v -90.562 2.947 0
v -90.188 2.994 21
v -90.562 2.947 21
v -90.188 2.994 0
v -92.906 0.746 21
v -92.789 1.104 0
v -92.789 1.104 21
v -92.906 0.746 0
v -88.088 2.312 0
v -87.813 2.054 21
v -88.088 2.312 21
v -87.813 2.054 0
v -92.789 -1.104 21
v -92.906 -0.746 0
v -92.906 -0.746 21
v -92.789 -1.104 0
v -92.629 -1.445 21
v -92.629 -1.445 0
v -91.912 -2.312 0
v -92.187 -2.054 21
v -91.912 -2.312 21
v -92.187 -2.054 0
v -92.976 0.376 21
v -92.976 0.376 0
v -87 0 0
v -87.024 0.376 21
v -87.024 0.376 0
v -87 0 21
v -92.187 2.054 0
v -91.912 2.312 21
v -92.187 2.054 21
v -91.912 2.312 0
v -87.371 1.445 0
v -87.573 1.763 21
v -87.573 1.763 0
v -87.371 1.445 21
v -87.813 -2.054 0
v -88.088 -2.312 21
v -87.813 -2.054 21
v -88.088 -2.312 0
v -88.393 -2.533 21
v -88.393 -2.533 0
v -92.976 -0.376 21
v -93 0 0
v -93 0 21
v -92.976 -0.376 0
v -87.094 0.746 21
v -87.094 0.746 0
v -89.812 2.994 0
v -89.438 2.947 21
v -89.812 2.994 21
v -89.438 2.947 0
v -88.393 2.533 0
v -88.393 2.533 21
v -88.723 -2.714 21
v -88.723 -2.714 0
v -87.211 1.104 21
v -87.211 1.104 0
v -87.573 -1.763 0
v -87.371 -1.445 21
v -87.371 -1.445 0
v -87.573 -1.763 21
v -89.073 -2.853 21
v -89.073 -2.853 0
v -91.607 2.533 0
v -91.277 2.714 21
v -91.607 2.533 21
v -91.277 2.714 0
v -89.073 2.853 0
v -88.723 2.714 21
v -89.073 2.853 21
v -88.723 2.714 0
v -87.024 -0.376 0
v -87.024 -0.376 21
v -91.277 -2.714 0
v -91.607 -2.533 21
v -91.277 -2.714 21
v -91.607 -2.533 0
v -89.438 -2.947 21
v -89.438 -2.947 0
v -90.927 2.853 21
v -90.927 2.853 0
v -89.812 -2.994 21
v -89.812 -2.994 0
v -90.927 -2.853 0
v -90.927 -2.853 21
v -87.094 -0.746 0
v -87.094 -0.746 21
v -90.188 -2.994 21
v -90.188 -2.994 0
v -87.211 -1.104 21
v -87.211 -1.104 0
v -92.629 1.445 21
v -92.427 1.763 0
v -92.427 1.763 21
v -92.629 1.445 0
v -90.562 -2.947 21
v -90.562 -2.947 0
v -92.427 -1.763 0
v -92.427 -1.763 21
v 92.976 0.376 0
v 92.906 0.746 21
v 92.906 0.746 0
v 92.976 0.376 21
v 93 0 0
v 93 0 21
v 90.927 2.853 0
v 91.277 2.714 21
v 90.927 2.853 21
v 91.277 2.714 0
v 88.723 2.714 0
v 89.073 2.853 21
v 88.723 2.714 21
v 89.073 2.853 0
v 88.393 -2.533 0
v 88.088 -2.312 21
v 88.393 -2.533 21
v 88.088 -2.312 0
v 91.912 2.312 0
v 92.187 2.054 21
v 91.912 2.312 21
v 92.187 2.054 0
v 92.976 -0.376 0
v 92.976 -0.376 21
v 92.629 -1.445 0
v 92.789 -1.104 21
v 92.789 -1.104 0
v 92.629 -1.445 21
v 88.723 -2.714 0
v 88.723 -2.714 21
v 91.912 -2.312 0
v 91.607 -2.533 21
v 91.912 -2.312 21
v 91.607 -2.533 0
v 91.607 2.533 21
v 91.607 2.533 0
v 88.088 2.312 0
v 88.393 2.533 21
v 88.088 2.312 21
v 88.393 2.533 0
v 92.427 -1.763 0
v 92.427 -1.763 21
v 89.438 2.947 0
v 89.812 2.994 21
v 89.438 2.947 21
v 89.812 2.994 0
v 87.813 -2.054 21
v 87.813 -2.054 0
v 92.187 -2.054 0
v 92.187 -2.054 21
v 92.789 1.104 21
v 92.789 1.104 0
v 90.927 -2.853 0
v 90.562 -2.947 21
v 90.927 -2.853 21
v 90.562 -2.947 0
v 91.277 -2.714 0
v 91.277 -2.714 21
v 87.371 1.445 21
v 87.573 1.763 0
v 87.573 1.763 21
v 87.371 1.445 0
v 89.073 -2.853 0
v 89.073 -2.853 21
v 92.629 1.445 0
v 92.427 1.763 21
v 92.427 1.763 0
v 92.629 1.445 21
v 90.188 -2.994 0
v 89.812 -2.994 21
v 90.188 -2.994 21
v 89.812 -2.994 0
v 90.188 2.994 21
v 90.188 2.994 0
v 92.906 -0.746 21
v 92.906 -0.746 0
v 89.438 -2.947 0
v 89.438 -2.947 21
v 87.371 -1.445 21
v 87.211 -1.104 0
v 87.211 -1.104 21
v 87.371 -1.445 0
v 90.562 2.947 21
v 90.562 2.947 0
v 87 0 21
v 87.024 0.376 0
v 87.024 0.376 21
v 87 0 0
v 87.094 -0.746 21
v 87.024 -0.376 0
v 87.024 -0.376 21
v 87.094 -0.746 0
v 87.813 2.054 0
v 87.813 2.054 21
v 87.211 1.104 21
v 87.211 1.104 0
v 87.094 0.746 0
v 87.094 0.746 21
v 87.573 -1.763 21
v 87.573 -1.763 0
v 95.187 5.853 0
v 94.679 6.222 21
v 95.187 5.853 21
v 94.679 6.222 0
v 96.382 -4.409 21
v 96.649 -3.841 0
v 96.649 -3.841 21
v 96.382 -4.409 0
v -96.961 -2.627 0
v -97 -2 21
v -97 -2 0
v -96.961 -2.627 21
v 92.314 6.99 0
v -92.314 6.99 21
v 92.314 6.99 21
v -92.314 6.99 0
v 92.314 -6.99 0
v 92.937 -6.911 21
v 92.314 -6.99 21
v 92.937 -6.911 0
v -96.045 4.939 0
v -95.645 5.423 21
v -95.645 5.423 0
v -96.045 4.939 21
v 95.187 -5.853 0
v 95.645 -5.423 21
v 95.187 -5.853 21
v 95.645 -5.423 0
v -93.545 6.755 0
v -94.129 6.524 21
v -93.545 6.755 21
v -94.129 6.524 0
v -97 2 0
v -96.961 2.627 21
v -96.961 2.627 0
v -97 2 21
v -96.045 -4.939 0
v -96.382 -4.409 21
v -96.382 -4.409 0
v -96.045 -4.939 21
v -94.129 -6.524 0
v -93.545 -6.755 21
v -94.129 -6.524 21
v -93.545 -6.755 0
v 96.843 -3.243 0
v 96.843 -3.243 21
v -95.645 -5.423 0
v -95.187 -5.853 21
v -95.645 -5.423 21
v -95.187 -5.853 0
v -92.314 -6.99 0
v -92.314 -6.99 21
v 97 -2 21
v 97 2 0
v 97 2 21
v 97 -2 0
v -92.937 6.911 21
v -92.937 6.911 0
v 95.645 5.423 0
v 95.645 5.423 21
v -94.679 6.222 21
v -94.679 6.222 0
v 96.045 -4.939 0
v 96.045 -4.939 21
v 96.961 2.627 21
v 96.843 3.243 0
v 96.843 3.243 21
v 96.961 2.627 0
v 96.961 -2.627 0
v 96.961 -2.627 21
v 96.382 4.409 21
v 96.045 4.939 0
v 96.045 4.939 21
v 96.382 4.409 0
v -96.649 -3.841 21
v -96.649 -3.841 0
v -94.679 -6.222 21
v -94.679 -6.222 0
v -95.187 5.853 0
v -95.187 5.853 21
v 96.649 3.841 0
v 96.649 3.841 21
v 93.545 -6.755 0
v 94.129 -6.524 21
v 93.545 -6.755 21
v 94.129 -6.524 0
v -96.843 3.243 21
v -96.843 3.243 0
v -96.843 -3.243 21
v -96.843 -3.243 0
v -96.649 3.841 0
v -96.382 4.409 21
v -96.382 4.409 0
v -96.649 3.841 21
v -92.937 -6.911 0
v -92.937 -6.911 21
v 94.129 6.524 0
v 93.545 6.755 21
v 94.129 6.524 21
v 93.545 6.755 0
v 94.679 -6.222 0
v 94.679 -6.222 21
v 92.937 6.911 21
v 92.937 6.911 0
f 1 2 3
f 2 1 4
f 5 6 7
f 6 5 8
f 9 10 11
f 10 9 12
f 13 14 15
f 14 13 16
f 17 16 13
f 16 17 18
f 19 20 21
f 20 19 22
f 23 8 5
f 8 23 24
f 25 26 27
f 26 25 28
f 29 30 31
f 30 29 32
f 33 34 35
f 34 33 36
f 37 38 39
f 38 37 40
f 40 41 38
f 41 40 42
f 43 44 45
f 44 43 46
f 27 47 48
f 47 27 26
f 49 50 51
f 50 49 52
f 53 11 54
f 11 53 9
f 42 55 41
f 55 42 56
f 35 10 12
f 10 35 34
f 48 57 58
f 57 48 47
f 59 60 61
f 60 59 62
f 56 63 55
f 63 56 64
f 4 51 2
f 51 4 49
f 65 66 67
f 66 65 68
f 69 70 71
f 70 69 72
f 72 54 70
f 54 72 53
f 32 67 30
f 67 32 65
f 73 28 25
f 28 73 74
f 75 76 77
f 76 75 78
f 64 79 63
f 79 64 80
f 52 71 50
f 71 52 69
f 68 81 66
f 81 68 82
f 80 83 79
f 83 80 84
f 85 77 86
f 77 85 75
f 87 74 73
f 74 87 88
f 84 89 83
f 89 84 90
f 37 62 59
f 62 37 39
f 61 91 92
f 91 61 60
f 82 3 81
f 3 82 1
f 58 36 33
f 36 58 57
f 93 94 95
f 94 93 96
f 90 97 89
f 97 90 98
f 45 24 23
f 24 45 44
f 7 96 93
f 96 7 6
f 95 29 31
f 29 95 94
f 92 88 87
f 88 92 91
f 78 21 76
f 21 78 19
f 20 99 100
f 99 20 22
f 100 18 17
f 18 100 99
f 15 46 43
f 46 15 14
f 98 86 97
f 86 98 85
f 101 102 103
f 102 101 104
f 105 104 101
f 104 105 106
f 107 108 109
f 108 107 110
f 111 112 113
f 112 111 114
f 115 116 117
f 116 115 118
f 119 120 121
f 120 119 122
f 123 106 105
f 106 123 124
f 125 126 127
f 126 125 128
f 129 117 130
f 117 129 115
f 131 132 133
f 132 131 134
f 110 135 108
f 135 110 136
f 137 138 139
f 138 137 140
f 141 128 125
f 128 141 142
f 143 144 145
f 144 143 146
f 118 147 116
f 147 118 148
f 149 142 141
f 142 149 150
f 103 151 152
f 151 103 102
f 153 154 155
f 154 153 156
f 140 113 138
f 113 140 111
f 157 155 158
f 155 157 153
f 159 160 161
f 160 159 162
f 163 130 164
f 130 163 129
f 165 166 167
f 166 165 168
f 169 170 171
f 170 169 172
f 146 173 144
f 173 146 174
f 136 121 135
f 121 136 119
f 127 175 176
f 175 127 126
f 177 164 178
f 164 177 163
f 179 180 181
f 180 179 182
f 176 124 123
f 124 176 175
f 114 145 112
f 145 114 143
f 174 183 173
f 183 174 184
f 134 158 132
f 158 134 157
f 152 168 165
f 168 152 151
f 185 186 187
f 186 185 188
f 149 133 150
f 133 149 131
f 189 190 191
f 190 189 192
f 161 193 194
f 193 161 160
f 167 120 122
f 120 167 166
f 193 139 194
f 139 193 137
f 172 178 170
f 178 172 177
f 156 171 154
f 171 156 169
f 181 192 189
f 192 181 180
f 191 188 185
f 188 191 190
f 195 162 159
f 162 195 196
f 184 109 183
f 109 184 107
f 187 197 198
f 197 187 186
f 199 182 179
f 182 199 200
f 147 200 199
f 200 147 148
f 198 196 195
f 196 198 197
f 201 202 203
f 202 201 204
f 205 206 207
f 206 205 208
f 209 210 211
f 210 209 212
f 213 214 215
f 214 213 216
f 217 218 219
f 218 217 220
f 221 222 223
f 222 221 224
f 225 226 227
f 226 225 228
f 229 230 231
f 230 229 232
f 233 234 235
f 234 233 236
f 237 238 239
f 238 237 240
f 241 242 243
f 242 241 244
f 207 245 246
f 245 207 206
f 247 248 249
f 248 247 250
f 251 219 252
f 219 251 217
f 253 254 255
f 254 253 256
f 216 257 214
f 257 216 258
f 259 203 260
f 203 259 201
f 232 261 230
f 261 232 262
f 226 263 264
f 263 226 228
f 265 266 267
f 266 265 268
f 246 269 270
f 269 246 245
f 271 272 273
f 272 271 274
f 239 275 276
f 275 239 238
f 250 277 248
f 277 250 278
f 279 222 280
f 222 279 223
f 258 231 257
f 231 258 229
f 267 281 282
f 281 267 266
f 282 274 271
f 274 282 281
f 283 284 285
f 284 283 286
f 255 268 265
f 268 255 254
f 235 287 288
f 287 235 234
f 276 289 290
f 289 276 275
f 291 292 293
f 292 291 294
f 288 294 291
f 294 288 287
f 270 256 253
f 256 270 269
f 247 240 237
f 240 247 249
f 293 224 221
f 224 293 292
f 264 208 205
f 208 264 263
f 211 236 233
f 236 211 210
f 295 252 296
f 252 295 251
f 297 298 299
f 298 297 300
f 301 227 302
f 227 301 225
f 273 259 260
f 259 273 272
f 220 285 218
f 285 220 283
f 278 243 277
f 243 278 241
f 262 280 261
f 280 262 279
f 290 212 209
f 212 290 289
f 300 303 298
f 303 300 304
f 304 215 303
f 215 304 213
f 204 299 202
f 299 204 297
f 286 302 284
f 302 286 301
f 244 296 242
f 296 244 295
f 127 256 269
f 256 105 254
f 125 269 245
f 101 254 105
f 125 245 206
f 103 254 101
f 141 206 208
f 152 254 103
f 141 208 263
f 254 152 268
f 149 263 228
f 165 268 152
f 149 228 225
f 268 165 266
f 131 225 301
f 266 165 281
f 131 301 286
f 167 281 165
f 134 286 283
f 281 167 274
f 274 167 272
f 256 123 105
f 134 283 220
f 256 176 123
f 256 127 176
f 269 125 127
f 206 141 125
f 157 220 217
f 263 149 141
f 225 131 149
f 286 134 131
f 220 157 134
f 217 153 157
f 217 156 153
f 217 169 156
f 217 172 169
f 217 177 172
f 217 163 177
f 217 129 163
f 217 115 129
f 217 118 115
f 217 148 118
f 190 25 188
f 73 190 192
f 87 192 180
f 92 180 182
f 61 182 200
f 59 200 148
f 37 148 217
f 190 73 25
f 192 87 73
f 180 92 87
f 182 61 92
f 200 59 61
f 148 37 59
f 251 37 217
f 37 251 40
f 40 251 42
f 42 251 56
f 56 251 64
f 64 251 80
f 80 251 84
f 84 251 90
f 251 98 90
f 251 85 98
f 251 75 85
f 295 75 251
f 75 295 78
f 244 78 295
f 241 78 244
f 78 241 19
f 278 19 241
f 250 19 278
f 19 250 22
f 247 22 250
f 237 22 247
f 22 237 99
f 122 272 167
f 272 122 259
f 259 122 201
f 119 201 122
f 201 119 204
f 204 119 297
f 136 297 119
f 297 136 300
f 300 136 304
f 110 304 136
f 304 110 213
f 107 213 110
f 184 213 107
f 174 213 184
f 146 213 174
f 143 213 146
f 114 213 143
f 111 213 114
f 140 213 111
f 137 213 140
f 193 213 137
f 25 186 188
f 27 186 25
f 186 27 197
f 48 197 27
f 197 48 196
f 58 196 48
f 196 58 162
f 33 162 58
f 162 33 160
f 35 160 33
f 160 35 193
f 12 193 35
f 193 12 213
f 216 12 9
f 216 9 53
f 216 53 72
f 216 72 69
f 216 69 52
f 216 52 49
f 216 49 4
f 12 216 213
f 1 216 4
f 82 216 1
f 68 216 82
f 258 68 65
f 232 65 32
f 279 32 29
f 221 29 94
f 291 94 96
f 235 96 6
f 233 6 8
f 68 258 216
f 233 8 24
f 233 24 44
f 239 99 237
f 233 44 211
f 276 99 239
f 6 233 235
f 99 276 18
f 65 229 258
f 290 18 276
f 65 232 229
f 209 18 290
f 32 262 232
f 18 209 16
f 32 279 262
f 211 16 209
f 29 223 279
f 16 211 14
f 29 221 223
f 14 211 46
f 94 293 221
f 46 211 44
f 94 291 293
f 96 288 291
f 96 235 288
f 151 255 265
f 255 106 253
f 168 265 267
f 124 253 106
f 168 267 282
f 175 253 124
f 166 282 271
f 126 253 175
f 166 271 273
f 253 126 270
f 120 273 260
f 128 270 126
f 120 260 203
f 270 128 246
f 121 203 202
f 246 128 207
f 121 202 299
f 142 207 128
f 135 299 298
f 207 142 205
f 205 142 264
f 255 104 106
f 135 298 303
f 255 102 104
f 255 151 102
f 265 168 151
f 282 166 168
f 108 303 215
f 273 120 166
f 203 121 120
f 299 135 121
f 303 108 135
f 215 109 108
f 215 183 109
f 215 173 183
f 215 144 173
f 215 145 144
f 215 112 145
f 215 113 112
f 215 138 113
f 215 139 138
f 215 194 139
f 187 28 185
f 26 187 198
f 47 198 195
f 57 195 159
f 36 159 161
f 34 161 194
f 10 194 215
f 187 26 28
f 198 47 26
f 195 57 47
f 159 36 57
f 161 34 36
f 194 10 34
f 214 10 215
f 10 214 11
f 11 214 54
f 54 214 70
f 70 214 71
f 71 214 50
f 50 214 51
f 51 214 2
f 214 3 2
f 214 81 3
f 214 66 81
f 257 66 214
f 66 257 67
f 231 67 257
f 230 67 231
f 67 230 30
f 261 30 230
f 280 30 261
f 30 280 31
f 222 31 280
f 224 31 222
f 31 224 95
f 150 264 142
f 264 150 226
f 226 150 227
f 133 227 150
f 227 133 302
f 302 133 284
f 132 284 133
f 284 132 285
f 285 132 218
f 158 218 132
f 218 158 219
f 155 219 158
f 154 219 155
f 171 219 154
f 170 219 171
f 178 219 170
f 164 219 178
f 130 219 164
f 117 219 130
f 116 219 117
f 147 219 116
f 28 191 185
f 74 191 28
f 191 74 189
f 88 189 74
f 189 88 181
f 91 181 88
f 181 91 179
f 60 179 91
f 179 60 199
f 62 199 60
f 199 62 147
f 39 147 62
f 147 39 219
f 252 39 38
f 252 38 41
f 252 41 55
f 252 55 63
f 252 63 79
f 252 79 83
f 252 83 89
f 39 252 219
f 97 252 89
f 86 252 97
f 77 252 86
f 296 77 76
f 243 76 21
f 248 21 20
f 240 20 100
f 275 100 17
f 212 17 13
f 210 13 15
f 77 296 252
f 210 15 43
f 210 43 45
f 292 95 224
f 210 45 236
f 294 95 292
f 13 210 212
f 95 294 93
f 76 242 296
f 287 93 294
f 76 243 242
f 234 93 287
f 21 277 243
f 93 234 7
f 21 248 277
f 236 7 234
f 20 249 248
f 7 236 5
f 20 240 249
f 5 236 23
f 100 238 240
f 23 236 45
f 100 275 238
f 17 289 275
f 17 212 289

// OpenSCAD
$fn = 50;


difference() {
	union() {
		hull() {
			translate(v = [-92.0000000000, 2.0000000000, 0]) {
				cylinder(h = 21, r = 5);
			}
			translate(v = [92.0000000000, 2.0000000000, 0]) {
				cylinder(h = 21, r = 5);
			}
			translate(v = [-92.0000000000, -2.0000000000, 0]) {
				cylinder(h = 21, r = 5);
			}
			translate(v = [92.0000000000, -2.0000000000, 0]) {
				cylinder(h = 21, r = 5);
			}
		}
	}
	union() {
		translate(v = [-90.0000000000, 0.0000000000, -100.0000000000]) {
			cylinder(h = 200, r = 3.0000000000);
		}
		translate(v = [-90.0000000000, 0.0000000000, -100.0000000000]) {
			cylinder(h = 200, r = 3.0000000000);
		}
		translate(v = [90.0000000000, 0.0000000000, -100.0000000000]) {
			cylinder(h = 200, r = 3.0000000000);
		}
		translate(v = [90.0000000000, 0.0000000000, -100.0000000000]) {
			cylinder(h = 200, r = 3.0000000000);
		}
	}
}
